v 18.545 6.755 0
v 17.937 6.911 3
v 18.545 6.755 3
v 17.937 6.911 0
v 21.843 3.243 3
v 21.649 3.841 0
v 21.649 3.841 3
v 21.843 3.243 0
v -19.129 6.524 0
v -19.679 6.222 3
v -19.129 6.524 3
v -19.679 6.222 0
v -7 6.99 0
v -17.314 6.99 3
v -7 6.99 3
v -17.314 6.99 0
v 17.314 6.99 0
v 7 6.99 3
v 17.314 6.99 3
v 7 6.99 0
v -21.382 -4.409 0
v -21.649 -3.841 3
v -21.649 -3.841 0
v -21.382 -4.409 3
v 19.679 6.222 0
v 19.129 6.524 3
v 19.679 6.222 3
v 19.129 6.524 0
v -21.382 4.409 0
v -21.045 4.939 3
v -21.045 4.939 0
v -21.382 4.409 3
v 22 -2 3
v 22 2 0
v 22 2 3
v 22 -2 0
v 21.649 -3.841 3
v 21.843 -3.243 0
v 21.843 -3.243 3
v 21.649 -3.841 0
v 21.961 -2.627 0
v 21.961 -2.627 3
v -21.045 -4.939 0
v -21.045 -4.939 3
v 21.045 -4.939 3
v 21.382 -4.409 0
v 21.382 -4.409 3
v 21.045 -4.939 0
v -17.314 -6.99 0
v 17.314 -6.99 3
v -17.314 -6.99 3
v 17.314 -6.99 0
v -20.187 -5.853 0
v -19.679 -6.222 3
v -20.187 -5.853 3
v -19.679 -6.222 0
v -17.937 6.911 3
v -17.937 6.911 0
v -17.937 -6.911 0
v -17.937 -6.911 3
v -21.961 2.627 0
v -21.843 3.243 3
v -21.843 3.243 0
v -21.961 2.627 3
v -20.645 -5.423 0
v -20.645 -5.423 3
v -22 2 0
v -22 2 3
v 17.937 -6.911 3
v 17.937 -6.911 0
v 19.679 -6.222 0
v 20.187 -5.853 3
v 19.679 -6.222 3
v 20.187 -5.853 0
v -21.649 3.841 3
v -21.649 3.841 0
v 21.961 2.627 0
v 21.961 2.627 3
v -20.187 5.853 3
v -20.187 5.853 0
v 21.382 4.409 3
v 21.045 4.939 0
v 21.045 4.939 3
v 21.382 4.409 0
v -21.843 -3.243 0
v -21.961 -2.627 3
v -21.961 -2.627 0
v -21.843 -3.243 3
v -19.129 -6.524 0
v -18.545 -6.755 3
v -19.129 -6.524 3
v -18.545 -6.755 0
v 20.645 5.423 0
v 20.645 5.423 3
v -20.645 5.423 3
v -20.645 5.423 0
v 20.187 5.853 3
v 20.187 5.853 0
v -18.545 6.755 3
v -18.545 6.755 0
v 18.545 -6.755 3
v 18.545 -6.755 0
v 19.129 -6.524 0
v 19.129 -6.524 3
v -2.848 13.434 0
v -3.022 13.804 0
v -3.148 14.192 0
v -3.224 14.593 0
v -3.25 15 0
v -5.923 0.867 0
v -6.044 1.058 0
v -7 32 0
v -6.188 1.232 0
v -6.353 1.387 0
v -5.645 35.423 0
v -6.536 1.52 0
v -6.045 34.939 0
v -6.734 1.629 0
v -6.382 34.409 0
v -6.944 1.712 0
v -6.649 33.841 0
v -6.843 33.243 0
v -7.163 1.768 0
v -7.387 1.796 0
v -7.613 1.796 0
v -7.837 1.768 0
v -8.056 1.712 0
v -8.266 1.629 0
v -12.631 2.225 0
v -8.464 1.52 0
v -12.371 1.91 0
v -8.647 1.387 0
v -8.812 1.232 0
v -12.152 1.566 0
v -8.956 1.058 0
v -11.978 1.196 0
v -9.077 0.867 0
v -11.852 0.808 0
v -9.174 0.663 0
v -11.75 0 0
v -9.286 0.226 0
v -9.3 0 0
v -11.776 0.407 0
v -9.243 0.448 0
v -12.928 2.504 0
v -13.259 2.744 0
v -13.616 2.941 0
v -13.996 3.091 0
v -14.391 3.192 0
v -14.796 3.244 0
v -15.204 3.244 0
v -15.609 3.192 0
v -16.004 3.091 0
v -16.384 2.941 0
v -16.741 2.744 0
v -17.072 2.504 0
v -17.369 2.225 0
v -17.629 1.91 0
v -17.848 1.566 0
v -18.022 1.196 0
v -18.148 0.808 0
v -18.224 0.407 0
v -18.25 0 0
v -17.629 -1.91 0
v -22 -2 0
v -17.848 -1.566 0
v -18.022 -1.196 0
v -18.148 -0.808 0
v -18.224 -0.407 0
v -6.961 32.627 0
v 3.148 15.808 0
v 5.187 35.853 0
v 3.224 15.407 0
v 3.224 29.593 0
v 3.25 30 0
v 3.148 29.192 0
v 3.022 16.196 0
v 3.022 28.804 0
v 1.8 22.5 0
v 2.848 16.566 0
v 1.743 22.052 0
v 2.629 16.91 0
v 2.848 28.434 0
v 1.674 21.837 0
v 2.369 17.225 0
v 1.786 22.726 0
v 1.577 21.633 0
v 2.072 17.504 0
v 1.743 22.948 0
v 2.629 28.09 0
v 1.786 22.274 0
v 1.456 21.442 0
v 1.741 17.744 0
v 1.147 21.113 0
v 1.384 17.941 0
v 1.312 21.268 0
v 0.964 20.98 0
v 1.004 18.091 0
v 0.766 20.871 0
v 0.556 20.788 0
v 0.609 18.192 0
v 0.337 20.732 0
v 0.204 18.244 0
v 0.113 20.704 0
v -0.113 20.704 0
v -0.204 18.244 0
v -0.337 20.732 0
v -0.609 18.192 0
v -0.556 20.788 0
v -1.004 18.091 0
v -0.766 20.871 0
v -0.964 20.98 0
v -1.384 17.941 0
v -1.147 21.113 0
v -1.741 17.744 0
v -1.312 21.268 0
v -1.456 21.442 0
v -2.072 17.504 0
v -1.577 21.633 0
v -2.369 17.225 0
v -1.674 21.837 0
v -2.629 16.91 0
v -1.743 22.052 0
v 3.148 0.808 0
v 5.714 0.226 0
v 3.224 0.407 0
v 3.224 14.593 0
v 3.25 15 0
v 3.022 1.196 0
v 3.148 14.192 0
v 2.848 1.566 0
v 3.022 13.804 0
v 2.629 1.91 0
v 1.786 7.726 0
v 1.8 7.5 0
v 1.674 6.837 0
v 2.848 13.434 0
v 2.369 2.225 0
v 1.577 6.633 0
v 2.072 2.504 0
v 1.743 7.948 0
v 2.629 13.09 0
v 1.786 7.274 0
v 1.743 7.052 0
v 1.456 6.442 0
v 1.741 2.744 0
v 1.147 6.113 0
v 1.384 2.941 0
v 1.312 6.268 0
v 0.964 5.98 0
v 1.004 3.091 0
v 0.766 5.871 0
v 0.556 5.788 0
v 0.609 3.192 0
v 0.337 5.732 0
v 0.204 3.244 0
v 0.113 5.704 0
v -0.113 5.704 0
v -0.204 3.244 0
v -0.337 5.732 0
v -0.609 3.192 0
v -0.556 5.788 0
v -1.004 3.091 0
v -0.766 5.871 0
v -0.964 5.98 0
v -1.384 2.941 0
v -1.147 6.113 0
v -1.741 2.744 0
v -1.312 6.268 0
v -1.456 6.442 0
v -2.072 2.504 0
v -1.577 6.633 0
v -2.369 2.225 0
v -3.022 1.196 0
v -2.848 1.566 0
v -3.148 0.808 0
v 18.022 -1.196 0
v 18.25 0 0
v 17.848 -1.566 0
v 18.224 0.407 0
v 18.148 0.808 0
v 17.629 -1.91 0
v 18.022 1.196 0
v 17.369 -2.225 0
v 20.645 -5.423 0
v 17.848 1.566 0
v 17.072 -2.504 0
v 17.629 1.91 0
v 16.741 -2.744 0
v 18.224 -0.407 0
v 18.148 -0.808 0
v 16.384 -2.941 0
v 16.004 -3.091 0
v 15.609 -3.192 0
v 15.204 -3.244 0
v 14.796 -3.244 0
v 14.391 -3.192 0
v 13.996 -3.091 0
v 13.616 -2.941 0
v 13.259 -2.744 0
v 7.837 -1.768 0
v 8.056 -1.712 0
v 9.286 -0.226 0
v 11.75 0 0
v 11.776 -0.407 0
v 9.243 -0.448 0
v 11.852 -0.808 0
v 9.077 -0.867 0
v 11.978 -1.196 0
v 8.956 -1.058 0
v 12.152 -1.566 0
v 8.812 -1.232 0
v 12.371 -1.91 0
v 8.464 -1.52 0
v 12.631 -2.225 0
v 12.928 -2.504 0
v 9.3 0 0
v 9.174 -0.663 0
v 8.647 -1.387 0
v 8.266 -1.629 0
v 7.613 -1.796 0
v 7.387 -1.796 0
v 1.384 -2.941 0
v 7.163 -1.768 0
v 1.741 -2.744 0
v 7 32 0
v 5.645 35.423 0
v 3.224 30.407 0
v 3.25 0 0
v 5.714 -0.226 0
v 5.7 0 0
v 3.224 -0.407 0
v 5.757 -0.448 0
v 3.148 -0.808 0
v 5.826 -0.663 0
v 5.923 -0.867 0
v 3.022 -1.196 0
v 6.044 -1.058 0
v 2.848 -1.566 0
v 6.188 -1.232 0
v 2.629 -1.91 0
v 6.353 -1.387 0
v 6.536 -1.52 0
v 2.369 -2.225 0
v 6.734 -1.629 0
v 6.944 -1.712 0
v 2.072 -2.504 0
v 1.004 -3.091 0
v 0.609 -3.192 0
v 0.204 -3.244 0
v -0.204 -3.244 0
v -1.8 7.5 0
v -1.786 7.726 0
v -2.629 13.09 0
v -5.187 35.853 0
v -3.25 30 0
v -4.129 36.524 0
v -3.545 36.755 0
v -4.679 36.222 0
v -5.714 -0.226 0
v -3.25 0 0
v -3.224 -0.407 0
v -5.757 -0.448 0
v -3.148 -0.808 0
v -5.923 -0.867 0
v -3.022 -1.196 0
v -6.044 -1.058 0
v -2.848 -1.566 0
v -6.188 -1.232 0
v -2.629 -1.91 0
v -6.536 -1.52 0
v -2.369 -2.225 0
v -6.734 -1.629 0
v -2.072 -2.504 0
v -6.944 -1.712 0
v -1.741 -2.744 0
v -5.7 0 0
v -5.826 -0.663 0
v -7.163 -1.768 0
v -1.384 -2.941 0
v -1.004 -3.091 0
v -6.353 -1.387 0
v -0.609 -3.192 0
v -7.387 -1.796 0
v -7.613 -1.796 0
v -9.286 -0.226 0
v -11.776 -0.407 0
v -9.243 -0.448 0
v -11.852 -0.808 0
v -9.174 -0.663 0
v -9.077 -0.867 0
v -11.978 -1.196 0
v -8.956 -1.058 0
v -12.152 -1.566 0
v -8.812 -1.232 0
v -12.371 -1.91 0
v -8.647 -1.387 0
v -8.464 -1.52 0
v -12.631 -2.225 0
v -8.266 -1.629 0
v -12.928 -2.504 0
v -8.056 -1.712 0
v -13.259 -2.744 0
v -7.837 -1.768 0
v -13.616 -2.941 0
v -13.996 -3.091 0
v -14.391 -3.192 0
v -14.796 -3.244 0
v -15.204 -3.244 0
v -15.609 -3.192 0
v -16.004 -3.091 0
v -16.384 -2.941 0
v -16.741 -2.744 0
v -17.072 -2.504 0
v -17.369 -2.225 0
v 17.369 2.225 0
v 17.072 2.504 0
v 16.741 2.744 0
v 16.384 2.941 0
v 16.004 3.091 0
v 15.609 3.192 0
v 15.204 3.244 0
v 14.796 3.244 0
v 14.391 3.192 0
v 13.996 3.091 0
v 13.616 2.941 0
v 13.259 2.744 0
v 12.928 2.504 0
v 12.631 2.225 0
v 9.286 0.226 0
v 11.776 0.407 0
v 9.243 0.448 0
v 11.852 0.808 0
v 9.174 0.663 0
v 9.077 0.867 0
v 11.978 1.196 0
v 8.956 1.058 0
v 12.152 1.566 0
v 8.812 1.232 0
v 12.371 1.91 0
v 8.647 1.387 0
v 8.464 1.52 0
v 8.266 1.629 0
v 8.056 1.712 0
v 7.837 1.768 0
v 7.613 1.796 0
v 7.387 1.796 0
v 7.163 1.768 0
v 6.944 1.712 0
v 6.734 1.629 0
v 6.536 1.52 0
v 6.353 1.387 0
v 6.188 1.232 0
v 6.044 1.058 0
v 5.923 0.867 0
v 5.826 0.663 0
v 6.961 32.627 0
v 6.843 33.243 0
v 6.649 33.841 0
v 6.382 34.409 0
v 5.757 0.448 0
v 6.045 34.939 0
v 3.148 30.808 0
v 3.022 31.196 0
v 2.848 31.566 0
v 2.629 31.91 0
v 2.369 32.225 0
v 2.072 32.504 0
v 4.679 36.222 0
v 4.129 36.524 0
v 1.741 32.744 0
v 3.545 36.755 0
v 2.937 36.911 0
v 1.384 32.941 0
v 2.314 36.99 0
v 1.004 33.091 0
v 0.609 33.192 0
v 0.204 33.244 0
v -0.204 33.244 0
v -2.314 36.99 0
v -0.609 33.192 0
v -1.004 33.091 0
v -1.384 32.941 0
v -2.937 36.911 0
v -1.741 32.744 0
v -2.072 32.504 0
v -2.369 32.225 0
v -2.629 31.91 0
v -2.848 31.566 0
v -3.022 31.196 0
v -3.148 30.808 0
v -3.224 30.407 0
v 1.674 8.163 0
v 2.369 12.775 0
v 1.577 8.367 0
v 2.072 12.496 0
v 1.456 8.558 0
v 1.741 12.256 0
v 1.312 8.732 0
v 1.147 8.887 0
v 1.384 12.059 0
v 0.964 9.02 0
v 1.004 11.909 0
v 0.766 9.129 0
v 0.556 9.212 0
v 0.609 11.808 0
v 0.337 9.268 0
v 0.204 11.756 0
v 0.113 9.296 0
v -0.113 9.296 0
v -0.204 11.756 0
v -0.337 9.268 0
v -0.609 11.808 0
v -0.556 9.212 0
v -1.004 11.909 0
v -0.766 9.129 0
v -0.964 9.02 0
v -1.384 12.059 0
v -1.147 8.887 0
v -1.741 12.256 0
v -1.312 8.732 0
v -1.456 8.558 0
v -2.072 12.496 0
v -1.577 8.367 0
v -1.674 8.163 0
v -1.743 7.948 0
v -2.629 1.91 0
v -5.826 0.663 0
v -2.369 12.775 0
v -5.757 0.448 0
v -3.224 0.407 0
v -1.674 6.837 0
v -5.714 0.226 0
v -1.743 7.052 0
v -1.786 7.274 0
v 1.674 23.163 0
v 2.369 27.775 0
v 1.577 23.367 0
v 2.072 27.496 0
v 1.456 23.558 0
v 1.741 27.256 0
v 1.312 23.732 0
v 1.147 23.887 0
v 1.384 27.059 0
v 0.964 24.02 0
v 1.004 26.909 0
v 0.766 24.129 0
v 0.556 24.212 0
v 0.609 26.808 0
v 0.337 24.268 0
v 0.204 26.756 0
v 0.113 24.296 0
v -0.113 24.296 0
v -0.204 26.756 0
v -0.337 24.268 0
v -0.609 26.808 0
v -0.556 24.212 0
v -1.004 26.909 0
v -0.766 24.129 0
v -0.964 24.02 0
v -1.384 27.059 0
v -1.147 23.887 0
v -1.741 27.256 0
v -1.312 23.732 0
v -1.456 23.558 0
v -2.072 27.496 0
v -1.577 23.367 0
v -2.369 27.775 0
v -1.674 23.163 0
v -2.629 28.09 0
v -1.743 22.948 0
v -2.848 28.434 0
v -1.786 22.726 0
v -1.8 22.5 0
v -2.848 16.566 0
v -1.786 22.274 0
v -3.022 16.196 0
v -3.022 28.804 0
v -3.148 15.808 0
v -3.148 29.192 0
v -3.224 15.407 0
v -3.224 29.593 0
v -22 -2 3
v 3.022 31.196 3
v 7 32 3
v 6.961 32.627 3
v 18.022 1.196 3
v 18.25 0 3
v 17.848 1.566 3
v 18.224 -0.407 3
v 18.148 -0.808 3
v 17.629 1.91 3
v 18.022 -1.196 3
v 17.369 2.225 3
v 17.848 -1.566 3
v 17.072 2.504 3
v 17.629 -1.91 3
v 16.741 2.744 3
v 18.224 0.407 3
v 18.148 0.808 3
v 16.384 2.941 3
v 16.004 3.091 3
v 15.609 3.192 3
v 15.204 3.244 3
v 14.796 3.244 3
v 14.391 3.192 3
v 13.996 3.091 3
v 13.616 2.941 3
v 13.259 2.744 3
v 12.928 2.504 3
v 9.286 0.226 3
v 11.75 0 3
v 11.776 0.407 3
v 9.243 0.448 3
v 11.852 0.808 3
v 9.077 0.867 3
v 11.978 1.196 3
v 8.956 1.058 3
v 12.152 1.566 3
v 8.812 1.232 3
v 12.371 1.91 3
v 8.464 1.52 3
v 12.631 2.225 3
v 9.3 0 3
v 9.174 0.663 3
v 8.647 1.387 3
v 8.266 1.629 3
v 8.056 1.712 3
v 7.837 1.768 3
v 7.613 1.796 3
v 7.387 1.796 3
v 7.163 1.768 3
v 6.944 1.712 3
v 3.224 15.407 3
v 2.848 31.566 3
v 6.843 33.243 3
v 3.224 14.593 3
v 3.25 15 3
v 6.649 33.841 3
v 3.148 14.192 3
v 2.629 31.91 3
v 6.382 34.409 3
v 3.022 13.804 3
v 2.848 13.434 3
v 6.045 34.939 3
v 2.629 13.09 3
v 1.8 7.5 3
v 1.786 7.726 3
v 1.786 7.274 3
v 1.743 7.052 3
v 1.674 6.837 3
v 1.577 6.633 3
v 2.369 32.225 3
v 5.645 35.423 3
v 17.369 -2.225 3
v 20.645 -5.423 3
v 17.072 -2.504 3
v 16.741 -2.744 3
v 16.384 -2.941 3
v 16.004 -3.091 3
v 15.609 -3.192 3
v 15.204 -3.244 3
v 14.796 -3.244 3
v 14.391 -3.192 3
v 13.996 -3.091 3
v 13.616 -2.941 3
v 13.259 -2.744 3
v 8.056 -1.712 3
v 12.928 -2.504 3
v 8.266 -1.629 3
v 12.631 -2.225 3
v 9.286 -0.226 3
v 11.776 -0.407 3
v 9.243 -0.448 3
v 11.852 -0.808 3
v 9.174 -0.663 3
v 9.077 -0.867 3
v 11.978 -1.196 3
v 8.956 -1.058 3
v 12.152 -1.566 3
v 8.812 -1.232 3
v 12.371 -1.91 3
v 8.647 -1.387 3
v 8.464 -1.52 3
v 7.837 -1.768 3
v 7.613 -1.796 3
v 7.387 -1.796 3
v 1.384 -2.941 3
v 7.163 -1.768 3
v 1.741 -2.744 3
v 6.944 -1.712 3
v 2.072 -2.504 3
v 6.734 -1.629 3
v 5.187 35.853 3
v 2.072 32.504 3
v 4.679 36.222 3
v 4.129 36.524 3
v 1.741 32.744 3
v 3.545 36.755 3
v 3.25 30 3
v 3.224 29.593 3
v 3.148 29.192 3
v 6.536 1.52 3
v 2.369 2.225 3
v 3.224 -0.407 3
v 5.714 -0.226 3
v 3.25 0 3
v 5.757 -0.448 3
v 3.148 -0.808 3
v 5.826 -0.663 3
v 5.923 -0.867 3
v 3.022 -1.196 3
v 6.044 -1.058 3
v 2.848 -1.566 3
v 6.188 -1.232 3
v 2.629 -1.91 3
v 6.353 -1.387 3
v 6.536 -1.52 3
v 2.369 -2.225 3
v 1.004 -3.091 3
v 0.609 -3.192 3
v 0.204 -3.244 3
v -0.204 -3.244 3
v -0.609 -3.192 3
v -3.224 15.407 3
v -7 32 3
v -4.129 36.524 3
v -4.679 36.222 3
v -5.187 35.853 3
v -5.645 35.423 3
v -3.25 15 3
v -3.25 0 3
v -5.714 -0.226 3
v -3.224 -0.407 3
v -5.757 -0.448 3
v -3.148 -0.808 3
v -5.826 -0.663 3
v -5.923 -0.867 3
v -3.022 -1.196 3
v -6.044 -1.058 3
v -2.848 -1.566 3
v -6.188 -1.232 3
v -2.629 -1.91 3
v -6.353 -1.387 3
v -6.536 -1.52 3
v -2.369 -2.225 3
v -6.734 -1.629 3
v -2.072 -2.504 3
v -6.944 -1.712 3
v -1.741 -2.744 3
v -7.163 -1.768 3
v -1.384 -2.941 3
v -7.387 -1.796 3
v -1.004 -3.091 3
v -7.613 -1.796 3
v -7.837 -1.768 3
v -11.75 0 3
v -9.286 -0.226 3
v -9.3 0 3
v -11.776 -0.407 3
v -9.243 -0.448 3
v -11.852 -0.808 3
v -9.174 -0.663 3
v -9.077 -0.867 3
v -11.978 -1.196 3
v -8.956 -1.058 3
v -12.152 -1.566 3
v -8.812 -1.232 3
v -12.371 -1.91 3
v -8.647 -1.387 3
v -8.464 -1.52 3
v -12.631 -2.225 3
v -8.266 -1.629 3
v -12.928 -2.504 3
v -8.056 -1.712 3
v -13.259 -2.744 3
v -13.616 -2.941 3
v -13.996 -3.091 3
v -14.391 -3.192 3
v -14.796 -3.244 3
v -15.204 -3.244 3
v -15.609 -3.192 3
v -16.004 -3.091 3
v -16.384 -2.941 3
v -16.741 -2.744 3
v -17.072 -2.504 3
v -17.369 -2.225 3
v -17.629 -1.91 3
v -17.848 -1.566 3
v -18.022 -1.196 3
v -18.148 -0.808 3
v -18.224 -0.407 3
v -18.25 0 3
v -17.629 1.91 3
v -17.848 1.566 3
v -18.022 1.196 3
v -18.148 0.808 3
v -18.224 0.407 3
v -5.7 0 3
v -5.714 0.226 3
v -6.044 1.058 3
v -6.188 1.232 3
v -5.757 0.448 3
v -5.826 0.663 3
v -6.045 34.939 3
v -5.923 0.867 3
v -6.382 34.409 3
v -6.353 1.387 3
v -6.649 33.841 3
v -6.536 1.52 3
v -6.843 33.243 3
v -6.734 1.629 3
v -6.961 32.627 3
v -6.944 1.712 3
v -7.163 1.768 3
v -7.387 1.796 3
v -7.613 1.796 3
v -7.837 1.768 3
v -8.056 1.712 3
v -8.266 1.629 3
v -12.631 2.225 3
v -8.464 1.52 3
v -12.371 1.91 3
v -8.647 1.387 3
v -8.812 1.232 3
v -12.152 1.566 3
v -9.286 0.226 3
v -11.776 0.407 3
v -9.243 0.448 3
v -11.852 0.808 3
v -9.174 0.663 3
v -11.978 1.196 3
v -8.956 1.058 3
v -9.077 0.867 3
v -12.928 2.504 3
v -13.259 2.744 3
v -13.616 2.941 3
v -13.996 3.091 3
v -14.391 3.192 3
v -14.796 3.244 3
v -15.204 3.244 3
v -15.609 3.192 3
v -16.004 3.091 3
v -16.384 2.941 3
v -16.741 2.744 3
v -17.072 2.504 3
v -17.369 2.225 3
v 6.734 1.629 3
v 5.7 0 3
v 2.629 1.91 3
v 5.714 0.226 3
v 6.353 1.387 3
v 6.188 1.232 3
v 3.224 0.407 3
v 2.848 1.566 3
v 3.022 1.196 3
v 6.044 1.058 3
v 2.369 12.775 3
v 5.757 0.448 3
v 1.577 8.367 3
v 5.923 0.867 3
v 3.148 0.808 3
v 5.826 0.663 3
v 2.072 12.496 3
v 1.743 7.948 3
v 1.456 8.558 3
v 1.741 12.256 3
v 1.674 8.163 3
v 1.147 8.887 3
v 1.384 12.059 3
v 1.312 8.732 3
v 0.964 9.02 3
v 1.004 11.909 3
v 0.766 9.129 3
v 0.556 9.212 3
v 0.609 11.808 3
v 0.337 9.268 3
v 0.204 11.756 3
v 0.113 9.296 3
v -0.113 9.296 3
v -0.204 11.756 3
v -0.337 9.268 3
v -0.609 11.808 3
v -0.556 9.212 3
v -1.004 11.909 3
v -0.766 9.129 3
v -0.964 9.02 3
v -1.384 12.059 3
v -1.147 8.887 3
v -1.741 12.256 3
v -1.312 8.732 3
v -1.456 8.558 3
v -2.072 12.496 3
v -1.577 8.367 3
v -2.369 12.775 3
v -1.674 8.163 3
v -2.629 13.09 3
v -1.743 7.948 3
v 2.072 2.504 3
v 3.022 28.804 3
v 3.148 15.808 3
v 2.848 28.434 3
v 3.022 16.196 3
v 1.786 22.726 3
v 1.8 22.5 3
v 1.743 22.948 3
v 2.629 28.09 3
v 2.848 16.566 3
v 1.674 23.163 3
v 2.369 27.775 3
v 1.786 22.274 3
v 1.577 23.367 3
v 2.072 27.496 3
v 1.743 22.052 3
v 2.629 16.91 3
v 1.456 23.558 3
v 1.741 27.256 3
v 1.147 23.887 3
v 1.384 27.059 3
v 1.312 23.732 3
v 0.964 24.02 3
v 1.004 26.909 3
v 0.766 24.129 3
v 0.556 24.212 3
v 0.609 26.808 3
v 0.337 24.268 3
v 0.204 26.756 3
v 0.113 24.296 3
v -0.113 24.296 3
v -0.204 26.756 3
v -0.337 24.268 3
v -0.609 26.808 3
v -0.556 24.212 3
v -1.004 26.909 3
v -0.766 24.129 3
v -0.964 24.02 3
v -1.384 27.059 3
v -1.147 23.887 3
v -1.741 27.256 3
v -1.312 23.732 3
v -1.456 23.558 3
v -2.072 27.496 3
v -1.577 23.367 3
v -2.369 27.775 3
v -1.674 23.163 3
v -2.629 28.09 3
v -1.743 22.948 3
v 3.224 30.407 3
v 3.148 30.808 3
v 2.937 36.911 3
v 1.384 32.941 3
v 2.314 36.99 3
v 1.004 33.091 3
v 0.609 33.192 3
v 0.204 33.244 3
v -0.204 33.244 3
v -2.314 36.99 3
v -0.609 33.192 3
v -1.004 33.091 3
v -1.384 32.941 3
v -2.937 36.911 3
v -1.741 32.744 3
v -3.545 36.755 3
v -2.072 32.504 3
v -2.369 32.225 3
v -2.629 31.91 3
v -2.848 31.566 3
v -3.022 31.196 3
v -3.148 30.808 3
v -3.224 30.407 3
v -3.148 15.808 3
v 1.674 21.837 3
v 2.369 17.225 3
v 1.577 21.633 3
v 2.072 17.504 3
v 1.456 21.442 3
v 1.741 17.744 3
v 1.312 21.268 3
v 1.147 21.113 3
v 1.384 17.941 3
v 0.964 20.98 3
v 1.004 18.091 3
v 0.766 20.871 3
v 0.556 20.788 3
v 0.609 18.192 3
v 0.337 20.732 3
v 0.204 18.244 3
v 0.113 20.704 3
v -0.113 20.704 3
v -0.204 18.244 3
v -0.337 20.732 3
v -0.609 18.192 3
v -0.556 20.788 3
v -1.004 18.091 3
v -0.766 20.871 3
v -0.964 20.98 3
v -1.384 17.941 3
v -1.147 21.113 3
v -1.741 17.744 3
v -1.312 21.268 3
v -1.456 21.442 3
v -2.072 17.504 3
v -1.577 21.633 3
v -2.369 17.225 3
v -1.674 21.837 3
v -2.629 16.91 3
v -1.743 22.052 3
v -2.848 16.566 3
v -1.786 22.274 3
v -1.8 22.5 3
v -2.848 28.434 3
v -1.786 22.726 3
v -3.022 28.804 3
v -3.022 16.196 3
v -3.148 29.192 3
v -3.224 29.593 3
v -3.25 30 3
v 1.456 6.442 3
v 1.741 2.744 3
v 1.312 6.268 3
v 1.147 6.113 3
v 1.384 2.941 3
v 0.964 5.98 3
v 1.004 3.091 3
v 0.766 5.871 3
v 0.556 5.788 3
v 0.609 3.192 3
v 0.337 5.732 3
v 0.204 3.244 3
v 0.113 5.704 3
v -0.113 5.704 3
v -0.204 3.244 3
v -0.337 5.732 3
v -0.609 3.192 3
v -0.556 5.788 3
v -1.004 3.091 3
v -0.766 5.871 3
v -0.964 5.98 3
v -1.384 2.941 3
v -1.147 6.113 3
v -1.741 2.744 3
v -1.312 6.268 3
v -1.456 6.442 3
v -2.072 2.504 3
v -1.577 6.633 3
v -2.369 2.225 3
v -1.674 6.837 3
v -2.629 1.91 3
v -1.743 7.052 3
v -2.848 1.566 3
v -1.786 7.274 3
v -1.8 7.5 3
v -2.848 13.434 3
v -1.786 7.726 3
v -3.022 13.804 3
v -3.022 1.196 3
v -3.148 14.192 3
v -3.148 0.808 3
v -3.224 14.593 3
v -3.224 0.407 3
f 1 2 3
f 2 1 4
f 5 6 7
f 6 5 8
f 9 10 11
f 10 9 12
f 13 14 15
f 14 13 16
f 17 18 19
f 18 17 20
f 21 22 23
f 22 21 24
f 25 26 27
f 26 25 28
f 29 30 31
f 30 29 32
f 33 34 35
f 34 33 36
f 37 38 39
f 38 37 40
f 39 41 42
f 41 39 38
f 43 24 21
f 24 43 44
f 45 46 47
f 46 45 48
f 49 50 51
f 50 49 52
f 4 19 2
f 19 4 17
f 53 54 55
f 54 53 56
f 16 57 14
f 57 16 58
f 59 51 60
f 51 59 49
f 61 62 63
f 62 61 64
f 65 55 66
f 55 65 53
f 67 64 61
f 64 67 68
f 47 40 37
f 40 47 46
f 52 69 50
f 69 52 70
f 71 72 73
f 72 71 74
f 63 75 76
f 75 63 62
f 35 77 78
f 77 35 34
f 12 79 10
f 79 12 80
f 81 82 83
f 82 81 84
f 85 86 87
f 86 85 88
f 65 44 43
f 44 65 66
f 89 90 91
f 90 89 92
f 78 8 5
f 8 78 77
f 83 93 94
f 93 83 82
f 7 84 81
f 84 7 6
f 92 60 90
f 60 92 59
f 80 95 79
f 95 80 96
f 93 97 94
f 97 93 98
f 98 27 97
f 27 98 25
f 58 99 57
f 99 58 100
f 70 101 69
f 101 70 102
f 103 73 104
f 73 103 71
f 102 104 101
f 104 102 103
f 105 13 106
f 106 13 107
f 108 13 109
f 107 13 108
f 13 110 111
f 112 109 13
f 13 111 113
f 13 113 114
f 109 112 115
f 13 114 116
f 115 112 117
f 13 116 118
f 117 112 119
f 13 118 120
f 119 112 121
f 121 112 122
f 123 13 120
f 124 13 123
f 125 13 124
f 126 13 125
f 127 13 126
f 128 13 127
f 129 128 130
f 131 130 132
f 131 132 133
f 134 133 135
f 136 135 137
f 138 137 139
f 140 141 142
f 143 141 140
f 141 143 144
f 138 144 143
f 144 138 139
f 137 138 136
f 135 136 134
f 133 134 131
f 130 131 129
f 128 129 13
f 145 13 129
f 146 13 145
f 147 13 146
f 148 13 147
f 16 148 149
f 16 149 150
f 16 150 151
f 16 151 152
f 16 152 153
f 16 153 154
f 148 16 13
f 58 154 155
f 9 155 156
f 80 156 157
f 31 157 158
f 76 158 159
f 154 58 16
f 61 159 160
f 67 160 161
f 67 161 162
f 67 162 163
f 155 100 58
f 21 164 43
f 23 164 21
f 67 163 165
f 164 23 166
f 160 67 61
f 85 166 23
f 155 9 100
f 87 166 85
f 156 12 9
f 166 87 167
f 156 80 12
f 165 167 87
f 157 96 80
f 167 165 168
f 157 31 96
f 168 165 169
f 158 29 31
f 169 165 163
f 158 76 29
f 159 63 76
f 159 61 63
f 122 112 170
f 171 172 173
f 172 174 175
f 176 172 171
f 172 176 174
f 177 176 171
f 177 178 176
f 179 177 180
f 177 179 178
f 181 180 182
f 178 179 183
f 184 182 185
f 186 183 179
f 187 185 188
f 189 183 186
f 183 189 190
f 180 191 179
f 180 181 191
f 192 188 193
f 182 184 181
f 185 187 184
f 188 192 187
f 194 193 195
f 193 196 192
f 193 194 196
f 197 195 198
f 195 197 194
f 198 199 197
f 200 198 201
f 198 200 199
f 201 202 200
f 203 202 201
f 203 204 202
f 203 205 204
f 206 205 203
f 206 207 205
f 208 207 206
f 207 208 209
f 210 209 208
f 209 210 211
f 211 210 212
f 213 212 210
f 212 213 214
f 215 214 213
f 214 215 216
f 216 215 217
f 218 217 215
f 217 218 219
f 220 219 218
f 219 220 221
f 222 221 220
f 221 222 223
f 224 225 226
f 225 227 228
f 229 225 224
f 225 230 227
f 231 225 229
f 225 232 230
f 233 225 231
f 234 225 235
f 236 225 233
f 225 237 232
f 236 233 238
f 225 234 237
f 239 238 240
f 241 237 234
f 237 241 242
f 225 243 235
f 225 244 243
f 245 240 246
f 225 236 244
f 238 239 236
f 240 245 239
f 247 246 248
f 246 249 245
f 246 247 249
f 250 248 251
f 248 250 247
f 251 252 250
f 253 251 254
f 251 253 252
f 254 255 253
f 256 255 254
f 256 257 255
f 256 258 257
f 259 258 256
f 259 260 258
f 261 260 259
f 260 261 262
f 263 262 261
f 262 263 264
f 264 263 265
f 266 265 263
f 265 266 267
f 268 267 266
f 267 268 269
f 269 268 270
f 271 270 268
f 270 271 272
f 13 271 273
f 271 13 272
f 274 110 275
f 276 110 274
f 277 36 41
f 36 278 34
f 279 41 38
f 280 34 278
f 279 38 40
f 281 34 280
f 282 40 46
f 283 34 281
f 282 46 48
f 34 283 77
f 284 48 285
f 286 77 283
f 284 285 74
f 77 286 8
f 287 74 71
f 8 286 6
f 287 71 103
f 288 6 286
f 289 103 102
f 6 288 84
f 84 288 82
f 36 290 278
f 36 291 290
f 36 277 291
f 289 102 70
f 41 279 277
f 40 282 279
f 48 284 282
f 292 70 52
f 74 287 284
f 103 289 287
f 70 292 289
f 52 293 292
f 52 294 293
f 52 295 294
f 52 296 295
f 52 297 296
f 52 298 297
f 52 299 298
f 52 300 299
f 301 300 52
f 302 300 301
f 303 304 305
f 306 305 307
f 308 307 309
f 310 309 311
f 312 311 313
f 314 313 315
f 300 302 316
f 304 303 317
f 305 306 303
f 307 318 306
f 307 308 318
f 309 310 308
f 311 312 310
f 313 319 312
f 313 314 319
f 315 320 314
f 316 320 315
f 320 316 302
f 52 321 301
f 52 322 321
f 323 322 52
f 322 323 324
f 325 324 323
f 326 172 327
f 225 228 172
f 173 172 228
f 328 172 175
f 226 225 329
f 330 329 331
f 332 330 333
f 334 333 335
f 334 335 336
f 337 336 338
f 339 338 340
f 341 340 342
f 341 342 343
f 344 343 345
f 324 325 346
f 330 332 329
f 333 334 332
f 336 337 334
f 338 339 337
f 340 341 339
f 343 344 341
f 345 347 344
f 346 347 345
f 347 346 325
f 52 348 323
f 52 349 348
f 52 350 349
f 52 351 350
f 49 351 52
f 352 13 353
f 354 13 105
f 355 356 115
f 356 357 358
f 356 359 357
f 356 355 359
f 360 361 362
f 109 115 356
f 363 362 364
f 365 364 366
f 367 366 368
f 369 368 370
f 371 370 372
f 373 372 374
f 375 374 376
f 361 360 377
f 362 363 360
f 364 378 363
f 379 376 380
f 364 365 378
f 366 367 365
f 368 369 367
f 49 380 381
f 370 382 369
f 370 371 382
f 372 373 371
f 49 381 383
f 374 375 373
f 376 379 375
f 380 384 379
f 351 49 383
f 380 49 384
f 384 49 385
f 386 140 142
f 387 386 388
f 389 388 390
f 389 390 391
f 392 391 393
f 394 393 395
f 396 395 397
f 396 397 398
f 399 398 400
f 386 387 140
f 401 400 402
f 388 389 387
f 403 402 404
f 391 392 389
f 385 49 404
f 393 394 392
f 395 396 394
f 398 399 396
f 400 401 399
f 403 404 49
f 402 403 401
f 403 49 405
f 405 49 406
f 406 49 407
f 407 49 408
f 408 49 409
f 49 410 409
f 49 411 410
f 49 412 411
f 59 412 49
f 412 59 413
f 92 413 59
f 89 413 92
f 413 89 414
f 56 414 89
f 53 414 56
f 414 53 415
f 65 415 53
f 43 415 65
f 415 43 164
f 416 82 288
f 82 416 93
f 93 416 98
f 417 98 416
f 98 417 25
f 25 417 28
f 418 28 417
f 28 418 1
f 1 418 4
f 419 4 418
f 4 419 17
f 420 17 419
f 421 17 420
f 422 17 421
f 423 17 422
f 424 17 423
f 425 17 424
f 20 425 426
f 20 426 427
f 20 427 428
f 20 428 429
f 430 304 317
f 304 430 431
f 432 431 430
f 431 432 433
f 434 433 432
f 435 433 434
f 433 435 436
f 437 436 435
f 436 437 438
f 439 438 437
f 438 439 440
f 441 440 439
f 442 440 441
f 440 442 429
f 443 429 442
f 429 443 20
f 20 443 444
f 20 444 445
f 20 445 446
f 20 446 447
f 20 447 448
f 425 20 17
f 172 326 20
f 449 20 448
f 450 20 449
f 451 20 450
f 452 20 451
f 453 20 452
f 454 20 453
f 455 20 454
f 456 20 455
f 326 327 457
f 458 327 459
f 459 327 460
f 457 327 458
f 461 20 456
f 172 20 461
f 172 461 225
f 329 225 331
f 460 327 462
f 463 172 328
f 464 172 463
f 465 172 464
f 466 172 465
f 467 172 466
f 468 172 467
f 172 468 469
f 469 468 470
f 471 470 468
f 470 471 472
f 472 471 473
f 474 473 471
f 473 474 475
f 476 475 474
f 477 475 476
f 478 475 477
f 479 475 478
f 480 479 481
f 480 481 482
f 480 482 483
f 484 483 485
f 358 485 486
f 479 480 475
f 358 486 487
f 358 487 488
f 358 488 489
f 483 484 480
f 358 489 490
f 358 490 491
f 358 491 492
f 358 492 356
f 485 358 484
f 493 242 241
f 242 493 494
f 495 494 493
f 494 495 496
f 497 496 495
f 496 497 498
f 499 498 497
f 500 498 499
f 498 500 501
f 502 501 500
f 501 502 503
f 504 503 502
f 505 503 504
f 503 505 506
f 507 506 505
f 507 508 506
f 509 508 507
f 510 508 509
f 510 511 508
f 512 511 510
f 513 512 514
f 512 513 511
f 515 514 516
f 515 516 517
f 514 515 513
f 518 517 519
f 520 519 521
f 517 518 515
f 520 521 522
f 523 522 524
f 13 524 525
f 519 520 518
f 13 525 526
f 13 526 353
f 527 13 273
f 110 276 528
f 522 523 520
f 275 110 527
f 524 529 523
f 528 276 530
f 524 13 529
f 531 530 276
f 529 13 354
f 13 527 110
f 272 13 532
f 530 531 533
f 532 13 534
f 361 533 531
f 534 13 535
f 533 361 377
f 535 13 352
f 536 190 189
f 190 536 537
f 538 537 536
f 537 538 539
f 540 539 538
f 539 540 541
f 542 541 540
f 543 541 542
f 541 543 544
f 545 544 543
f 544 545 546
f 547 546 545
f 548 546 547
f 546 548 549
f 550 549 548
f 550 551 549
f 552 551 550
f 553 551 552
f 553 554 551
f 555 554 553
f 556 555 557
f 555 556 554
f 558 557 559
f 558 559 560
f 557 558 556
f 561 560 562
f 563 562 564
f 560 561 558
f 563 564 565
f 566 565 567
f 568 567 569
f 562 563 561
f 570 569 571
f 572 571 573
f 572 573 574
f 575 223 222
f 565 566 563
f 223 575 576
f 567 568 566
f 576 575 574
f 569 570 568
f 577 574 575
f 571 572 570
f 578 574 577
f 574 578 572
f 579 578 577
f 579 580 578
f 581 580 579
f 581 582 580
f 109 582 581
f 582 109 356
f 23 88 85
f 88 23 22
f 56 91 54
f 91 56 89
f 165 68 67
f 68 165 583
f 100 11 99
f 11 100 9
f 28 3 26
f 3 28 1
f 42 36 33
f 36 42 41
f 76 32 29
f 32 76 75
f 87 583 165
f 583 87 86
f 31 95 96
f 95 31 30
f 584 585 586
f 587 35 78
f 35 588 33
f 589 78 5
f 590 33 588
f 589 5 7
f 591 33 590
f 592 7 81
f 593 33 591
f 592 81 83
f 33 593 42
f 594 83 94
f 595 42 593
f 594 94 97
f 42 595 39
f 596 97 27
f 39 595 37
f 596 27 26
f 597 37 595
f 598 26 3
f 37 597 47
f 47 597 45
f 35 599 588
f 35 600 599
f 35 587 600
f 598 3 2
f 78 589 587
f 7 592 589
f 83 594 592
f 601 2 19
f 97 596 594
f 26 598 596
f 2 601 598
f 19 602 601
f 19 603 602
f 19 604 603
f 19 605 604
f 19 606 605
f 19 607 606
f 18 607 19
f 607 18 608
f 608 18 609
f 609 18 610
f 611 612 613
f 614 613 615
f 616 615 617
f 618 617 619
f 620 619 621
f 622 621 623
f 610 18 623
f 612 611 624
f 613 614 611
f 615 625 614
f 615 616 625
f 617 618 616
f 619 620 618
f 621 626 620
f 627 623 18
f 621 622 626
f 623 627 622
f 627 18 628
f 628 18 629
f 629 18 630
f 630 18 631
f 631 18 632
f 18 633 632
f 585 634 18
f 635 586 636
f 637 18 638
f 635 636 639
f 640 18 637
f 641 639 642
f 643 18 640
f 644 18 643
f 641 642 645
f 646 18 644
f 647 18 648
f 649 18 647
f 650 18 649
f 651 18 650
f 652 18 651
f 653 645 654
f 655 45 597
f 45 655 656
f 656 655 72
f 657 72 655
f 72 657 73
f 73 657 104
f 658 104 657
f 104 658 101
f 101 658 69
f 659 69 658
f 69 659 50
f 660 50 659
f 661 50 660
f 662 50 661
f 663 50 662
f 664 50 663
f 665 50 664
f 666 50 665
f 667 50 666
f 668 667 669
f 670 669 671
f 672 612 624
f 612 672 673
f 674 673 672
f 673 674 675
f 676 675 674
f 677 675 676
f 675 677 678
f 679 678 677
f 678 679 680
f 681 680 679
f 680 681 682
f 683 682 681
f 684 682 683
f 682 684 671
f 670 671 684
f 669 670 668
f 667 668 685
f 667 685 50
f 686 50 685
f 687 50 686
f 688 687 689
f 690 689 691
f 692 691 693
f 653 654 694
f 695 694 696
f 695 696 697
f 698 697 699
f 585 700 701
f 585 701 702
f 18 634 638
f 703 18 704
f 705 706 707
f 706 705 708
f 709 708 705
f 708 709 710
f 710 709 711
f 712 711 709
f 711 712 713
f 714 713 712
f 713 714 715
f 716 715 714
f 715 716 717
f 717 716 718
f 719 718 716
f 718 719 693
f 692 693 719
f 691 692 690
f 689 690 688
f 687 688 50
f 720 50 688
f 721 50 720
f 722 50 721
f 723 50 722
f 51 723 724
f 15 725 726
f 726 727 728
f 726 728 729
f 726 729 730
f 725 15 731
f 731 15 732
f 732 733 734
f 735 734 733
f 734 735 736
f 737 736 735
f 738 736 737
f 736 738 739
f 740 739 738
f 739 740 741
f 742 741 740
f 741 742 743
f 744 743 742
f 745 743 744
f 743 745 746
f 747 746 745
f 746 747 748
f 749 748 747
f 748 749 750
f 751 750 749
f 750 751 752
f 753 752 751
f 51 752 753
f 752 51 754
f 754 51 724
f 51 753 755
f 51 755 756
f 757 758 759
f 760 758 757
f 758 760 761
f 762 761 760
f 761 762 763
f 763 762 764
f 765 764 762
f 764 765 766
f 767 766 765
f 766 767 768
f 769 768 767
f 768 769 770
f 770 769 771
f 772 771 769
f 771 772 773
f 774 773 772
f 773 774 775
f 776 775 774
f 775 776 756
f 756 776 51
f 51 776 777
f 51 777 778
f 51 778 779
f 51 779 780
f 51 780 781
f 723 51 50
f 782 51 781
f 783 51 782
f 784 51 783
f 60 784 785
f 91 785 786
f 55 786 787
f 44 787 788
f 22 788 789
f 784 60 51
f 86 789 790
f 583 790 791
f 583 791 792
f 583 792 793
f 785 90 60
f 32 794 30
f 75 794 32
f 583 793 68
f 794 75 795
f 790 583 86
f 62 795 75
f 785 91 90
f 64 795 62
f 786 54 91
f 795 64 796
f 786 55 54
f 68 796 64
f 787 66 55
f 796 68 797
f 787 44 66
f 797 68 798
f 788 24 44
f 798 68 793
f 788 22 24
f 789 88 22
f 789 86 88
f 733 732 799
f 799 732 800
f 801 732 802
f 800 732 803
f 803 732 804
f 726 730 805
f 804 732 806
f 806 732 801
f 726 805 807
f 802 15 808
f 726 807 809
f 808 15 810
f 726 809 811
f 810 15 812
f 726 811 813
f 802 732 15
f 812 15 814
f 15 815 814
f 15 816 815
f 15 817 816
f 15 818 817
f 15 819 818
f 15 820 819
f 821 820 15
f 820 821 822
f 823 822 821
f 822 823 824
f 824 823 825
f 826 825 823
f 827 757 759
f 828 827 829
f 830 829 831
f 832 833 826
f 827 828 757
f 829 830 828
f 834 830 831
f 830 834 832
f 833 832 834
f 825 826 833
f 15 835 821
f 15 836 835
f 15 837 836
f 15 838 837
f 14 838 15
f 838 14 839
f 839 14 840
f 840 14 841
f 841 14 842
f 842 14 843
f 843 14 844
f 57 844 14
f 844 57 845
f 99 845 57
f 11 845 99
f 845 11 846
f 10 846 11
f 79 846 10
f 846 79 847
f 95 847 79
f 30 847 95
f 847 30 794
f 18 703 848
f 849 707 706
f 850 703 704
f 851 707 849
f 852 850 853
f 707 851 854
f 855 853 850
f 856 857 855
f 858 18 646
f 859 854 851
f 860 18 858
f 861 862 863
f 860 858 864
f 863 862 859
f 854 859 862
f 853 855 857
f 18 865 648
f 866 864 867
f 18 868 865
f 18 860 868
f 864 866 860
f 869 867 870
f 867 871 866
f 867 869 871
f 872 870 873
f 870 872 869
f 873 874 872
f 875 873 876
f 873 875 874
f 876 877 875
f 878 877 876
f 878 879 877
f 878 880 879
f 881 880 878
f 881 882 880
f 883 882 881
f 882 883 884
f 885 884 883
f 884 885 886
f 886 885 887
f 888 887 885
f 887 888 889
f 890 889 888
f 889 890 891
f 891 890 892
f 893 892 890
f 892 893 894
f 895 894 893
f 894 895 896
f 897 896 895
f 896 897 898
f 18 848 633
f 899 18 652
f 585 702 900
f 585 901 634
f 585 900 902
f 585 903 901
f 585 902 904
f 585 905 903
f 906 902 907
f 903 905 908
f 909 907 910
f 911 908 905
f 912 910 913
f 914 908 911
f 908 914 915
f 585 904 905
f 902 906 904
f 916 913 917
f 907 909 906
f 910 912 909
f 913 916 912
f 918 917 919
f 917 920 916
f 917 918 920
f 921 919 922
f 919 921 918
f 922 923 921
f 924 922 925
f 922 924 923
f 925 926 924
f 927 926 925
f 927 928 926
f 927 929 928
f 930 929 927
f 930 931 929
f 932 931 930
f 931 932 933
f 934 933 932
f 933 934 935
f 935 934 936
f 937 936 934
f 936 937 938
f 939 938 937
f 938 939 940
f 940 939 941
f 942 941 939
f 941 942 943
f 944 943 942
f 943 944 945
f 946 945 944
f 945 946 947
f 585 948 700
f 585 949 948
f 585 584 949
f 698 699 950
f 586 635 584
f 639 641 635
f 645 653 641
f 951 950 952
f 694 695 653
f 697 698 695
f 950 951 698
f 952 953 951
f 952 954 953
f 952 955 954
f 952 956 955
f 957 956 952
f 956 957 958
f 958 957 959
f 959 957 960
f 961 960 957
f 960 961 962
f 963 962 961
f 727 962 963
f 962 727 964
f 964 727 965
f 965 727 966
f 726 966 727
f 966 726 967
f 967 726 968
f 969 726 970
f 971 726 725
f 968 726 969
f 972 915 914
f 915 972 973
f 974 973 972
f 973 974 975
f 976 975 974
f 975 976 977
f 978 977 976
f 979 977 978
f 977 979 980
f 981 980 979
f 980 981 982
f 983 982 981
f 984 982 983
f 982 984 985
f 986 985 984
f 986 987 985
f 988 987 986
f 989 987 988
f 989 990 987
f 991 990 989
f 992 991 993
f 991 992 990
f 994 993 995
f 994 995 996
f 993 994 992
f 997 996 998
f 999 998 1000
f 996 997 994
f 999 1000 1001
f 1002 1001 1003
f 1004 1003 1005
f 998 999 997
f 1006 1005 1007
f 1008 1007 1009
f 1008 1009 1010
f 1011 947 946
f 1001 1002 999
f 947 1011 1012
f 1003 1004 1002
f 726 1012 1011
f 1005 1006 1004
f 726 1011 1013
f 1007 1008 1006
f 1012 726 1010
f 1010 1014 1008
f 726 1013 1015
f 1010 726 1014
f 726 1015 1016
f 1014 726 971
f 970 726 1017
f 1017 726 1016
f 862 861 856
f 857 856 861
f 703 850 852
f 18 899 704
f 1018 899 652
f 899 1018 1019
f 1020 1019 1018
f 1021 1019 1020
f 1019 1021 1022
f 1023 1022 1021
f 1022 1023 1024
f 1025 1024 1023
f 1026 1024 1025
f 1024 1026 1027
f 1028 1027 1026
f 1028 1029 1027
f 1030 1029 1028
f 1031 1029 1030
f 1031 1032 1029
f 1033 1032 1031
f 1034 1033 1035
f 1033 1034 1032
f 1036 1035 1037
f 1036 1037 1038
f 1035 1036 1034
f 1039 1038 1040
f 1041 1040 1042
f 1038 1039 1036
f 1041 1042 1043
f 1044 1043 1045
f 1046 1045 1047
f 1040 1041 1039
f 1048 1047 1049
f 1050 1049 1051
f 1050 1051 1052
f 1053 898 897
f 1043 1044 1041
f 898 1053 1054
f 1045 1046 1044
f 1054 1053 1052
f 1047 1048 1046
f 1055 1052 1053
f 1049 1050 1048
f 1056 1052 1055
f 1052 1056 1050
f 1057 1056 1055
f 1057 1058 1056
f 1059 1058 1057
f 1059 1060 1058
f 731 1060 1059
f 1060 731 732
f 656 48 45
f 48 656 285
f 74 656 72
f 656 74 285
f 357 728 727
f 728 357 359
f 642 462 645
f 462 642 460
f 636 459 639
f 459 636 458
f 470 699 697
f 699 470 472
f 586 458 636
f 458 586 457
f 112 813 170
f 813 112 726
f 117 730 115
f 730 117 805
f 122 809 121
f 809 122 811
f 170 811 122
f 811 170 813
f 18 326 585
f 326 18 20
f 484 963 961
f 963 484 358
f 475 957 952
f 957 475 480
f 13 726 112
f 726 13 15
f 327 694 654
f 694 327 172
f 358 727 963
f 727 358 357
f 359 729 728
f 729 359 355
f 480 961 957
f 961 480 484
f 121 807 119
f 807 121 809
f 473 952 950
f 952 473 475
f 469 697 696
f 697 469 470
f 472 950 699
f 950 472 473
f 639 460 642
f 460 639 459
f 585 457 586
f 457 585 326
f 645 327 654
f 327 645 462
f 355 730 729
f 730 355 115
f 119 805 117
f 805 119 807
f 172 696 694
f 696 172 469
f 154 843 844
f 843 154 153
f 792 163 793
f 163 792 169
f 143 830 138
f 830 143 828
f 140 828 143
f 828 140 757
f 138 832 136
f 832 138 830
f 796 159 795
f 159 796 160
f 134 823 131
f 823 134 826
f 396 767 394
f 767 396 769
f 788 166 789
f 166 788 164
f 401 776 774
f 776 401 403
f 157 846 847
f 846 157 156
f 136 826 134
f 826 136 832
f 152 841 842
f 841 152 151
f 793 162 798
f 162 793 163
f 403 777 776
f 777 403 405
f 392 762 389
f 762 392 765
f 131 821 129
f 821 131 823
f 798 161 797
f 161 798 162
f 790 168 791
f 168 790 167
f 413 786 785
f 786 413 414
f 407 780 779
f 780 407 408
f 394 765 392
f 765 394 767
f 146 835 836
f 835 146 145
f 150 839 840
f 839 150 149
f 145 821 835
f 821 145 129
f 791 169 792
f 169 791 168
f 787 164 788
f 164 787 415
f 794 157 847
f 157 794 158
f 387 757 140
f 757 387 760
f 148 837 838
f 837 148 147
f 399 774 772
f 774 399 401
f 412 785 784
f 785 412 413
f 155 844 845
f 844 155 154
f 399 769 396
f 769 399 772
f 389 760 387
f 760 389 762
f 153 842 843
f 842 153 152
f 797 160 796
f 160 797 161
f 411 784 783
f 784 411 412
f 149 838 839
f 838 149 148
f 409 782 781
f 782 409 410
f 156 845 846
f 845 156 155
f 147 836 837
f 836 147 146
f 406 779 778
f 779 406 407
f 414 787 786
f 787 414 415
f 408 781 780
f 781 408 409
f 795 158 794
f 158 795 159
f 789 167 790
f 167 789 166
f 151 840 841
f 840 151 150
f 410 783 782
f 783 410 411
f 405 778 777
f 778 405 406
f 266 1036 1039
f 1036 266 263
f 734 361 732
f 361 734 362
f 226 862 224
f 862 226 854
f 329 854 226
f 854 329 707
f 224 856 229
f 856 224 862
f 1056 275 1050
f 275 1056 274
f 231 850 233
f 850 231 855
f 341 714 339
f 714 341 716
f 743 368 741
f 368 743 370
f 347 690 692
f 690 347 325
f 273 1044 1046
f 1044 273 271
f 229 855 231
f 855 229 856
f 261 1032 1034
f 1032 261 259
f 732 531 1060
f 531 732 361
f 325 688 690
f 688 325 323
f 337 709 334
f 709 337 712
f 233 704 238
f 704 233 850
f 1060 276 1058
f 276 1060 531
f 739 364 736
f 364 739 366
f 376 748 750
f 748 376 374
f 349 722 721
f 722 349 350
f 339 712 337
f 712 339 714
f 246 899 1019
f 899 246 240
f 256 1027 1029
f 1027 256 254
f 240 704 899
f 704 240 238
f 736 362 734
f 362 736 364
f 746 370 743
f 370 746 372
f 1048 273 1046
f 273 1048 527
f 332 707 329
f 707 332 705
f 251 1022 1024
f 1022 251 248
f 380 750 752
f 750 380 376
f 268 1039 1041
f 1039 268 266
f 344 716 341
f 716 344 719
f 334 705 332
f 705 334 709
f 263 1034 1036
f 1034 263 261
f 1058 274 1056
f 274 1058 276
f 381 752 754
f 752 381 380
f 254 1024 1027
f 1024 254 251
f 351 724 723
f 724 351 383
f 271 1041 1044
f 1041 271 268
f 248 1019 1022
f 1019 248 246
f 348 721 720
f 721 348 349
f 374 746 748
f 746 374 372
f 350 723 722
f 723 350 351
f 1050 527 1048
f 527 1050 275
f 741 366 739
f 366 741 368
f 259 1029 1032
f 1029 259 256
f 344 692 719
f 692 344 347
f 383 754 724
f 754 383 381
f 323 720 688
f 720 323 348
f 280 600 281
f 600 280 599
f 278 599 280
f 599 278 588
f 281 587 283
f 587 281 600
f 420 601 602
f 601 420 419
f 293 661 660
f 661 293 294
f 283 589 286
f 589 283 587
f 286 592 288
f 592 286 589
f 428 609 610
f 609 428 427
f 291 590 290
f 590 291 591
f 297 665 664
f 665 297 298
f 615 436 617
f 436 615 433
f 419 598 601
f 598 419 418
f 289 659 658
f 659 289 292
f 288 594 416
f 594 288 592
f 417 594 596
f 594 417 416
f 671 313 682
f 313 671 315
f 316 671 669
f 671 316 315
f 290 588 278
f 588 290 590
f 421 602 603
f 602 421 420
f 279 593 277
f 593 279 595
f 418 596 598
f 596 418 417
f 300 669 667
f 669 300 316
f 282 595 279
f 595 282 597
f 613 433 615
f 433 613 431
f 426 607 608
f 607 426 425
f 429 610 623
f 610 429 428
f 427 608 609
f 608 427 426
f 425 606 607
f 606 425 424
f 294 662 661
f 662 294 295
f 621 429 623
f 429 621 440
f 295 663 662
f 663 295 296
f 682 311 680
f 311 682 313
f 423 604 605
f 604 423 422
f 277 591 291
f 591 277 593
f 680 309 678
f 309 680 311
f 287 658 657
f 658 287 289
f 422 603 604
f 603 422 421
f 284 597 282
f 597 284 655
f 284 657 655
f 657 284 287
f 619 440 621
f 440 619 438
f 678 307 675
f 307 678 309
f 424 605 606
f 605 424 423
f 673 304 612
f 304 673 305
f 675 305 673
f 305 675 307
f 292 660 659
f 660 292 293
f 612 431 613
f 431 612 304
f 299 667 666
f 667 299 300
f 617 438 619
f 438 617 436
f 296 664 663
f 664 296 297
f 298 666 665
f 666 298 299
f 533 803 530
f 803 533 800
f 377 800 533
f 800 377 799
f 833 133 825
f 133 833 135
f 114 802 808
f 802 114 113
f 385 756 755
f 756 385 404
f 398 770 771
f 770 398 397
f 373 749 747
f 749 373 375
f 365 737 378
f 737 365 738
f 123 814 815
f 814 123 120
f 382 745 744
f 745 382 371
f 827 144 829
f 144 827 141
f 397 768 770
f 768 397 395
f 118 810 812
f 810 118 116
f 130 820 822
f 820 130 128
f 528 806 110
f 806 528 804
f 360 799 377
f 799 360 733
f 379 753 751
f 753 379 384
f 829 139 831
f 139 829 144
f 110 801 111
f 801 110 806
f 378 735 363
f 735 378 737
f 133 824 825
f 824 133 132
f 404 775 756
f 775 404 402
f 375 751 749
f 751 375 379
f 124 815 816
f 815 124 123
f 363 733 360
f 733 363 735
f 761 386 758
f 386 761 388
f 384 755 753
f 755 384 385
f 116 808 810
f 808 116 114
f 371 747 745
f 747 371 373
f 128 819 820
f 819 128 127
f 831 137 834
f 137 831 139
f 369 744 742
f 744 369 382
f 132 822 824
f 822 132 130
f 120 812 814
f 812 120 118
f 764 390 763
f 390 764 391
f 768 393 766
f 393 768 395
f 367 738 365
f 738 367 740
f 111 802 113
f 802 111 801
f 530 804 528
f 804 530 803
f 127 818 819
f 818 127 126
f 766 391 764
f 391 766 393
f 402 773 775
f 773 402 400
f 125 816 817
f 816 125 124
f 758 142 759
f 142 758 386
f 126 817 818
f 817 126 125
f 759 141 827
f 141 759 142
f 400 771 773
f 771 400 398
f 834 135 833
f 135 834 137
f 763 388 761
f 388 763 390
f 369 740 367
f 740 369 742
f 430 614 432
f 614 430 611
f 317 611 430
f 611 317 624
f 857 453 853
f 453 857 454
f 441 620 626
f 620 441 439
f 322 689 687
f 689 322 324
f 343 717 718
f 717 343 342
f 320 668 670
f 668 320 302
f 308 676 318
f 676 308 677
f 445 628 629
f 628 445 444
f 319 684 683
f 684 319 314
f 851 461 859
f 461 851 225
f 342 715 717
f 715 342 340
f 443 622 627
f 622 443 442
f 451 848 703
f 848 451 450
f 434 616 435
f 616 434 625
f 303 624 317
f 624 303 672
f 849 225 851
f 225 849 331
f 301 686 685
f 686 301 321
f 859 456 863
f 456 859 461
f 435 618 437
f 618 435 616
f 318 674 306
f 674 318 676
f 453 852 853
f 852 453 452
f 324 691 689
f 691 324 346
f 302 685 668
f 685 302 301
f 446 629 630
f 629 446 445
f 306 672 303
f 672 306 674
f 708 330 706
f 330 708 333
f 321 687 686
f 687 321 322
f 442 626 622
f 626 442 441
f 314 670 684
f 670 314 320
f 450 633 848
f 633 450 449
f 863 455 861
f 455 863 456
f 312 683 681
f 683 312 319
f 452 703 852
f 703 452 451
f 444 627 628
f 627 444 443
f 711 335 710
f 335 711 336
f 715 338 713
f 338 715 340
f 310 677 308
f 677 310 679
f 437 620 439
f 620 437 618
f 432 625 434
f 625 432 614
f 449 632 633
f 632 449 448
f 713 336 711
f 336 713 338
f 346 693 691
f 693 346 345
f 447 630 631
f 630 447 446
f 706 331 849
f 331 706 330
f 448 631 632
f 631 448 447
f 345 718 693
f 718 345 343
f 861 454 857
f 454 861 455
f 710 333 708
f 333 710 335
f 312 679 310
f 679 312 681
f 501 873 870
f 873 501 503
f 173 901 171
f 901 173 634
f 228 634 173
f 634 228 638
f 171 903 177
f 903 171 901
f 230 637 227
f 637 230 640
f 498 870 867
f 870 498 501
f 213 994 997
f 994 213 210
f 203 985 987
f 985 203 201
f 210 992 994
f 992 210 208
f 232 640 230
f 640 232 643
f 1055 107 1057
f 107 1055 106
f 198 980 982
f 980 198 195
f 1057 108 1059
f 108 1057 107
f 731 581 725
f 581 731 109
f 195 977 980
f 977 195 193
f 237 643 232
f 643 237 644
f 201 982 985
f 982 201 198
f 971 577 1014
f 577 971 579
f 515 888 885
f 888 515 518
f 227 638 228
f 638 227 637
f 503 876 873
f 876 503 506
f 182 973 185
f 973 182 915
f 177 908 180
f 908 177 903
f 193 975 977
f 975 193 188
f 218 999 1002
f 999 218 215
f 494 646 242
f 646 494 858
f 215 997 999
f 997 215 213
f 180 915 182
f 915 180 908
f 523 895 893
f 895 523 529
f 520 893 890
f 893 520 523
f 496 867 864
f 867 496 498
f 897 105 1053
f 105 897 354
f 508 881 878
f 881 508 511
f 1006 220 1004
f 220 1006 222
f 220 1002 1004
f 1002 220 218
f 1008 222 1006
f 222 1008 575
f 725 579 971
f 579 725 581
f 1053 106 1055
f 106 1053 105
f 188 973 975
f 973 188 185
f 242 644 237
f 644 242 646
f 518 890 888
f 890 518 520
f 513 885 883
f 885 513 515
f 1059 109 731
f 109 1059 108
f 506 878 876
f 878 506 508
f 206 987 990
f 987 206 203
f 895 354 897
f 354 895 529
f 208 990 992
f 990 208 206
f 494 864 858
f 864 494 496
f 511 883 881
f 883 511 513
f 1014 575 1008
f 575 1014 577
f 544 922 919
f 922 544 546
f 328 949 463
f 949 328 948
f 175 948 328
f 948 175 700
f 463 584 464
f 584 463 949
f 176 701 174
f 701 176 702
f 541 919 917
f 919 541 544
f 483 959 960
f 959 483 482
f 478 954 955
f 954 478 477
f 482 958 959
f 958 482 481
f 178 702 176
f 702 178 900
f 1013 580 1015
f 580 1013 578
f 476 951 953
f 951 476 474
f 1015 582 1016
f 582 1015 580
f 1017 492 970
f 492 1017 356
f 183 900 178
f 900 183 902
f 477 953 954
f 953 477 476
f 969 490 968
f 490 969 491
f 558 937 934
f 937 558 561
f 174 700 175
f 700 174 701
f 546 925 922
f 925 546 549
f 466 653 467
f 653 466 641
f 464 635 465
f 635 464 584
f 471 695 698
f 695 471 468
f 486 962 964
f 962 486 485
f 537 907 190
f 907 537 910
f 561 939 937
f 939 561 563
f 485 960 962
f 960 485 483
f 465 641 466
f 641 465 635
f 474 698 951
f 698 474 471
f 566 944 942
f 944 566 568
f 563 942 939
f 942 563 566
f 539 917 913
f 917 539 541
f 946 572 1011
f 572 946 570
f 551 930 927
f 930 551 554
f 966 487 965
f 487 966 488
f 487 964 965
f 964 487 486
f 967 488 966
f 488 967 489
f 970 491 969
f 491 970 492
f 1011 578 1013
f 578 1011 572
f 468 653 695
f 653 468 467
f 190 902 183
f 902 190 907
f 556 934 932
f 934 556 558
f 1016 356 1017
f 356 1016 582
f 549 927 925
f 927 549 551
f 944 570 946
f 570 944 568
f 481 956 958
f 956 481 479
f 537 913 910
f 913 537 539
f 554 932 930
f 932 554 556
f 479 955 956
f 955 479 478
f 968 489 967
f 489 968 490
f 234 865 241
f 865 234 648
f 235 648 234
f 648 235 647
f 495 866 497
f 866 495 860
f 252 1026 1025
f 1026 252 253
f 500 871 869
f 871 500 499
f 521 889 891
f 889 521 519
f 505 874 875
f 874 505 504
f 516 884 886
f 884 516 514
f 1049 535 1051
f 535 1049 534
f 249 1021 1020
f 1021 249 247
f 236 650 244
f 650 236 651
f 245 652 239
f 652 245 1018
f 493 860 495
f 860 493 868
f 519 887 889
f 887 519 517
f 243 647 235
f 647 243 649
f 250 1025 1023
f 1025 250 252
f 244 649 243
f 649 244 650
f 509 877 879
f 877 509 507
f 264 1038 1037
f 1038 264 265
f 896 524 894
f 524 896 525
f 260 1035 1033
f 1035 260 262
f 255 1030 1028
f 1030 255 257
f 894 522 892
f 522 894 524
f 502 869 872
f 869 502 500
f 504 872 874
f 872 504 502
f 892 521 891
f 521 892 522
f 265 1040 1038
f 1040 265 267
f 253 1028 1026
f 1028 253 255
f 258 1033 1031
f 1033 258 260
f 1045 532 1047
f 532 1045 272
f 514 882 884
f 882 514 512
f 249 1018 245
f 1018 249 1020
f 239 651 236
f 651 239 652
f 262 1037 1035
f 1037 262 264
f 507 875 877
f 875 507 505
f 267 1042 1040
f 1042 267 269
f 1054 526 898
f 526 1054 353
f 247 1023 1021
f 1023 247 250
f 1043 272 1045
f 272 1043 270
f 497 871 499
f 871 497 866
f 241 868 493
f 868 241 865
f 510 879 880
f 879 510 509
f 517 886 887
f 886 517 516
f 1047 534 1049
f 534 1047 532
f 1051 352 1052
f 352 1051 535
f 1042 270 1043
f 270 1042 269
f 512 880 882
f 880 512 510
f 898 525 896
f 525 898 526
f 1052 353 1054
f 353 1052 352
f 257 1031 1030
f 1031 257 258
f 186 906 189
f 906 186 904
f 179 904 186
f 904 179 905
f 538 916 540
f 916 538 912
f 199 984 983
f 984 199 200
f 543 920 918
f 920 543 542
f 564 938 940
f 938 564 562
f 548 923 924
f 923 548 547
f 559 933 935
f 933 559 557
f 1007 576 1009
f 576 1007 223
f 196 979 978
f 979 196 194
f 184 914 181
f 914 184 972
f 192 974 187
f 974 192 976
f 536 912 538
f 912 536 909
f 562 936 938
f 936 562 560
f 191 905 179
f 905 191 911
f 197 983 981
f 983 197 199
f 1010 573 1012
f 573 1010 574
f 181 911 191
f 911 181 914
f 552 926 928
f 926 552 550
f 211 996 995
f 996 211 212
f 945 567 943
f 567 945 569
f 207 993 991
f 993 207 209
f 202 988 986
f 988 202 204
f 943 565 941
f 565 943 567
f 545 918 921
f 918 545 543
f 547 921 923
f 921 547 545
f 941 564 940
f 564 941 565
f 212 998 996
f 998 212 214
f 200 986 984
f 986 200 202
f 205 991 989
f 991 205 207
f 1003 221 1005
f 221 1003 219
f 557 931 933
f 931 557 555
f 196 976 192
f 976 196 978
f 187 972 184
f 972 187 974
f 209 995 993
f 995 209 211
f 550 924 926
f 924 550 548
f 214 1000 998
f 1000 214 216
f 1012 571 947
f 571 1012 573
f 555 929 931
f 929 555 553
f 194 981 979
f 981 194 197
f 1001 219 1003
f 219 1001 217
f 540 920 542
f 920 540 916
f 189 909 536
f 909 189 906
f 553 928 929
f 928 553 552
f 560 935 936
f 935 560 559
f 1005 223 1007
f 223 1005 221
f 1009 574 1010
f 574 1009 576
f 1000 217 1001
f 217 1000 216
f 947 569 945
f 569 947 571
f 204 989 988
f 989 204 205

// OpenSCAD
$fn = 50;


difference() {
	union() {
		*color(alpha = 1.0000000000, c = "gray") {
			translate(v = [0, 7, 0]) {
				linear_extrude(height = 1) {
					text(font = "Arial:style=Bold", halign = "center", size = 4.5000000000, text = "COMMENT plate main", valign = "center");
				}
			}
		}
		hull() {
			translate(v = [-17.0000000000, 2.0000000000, 0]) {
				cylinder(h = 3, r = 5);
			}
			translate(v = [17.0000000000, 2.0000000000, 0]) {
				cylinder(h = 3, r = 5);
			}
			translate(v = [-17.0000000000, -2.0000000000, 0]) {
				cylinder(h = 3, r = 5);
			}
			translate(v = [17.0000000000, -2.0000000000, 0]) {
				cylinder(h = 3, r = 5);
			}
		}
		*color(alpha = 1.0000000000, c = "gray") {
			translate(v = [0, 7, 0]) {
				linear_extrude(height = 1) {
					text(font = "Arial:style=Bold", halign = "center", size = 4.5000000000, text = "COMMENT plate main", valign = "center");
				}
			}
		}
		translate(v = [0, 15.0000000000, 0]) {
			hull() {
				translate(v = [-2.0000000000, 17.0000000000, 0]) {
					cylinder(h = 3, r = 5);
				}
				translate(v = [2.0000000000, 17.0000000000, 0]) {
					cylinder(h = 3, r = 5);
				}
				translate(v = [-2.0000000000, -17.0000000000, 0]) {
					cylinder(h = 3, r = 5);
				}
				translate(v = [2.0000000000, -17.0000000000, 0]) {
					cylinder(h = 3, r = 5);
				}
			}
		}
	}
	union() {
		*color(alpha = 1.0000000000, c = "gray") {
			translate(v = [0, 7, 0]) {
				linear_extrude(height = 1) {
					text(font = "Arial:style=Bold", halign = "center", size = 4.5000000000, text = "COMMENT holes main", valign = "center");
				}
			}
		}
		translate(v = [-15.0000000000, 0.0000000000, 0]) {
			translate(v = [0, 0, -100]) {
				cylinder(h = 200, r = 3.2500000000);
			}
		}
		translate(v = [0, 0, -100]) {
			cylinder(h = 200, r = 3.2500000000);
		}
		translate(v = [15.0000000000, 0.0000000000, 0]) {
			translate(v = [0, 0, -100]) {
				cylinder(h = 200, r = 3.2500000000);
			}
		}
		translate(v = [-15.0000000000, 0.0000000000, 0]) {
			translate(v = [0, 0, -100]) {
				cylinder(h = 200, r = 1.8000000000);
			}
		}
		translate(v = [-7.5000000000, 0.0000000000, 0]) {
			translate(v = [0, 0, -100]) {
				cylinder(h = 200, r = 1.8000000000);
			}
		}
		translate(v = [0, 0, -100]) {
			cylinder(h = 200, r = 1.8000000000);
		}
		translate(v = [7.5000000000, 0.0000000000, 0]) {
			translate(v = [0, 0, -100]) {
				cylinder(h = 200, r = 1.8000000000);
			}
		}
		translate(v = [15.0000000000, 0.0000000000, 0]) {
			translate(v = [0, 0, -100]) {
				cylinder(h = 200, r = 1.8000000000);
			}
		}
		*color(alpha = 1.0000000000, c = "gray") {
			translate(v = [0, 7, 0]) {
				linear_extrude(height = 1) {
					text(font = "Arial:style=Bold", halign = "center", size = 4.5000000000, text = "COMMENT holes main", valign = "center");
				}
			}
		}
		translate(v = [0, 0, -100]) {
			cylinder(h = 200, r = 3.2500000000);
		}
		translate(v = [0.0000000000, 15.0000000000, 0]) {
			translate(v = [0, 0, -100]) {
				cylinder(h = 200, r = 3.2500000000);
			}
		}
		translate(v = [0.0000000000, 30.0000000000, 0]) {
			translate(v = [0, 0, -100]) {
				cylinder(h = 200, r = 3.2500000000);
			}
		}
		translate(v = [0, 0, -100]) {
			cylinder(h = 200, r = 1.8000000000);
		}
		translate(v = [0.0000000000, 7.5000000000, 0]) {
			translate(v = [0, 0, -100]) {
				cylinder(h = 200, r = 1.8000000000);
			}
		}
		translate(v = [0.0000000000, 15.0000000000, 0]) {
			translate(v = [0, 0, -100]) {
				cylinder(h = 200, r = 1.8000000000);
			}
		}
		translate(v = [0.0000000000, 22.5000000000, 0]) {
			translate(v = [0, 0, -100]) {
				cylinder(h = 200, r = 1.8000000000);
			}
		}
		translate(v = [0.0000000000, 30.0000000000, 0]) {
			translate(v = [0, 0, -100]) {
				cylinder(h = 200, r = 1.8000000000);
			}
		}
	}
}
